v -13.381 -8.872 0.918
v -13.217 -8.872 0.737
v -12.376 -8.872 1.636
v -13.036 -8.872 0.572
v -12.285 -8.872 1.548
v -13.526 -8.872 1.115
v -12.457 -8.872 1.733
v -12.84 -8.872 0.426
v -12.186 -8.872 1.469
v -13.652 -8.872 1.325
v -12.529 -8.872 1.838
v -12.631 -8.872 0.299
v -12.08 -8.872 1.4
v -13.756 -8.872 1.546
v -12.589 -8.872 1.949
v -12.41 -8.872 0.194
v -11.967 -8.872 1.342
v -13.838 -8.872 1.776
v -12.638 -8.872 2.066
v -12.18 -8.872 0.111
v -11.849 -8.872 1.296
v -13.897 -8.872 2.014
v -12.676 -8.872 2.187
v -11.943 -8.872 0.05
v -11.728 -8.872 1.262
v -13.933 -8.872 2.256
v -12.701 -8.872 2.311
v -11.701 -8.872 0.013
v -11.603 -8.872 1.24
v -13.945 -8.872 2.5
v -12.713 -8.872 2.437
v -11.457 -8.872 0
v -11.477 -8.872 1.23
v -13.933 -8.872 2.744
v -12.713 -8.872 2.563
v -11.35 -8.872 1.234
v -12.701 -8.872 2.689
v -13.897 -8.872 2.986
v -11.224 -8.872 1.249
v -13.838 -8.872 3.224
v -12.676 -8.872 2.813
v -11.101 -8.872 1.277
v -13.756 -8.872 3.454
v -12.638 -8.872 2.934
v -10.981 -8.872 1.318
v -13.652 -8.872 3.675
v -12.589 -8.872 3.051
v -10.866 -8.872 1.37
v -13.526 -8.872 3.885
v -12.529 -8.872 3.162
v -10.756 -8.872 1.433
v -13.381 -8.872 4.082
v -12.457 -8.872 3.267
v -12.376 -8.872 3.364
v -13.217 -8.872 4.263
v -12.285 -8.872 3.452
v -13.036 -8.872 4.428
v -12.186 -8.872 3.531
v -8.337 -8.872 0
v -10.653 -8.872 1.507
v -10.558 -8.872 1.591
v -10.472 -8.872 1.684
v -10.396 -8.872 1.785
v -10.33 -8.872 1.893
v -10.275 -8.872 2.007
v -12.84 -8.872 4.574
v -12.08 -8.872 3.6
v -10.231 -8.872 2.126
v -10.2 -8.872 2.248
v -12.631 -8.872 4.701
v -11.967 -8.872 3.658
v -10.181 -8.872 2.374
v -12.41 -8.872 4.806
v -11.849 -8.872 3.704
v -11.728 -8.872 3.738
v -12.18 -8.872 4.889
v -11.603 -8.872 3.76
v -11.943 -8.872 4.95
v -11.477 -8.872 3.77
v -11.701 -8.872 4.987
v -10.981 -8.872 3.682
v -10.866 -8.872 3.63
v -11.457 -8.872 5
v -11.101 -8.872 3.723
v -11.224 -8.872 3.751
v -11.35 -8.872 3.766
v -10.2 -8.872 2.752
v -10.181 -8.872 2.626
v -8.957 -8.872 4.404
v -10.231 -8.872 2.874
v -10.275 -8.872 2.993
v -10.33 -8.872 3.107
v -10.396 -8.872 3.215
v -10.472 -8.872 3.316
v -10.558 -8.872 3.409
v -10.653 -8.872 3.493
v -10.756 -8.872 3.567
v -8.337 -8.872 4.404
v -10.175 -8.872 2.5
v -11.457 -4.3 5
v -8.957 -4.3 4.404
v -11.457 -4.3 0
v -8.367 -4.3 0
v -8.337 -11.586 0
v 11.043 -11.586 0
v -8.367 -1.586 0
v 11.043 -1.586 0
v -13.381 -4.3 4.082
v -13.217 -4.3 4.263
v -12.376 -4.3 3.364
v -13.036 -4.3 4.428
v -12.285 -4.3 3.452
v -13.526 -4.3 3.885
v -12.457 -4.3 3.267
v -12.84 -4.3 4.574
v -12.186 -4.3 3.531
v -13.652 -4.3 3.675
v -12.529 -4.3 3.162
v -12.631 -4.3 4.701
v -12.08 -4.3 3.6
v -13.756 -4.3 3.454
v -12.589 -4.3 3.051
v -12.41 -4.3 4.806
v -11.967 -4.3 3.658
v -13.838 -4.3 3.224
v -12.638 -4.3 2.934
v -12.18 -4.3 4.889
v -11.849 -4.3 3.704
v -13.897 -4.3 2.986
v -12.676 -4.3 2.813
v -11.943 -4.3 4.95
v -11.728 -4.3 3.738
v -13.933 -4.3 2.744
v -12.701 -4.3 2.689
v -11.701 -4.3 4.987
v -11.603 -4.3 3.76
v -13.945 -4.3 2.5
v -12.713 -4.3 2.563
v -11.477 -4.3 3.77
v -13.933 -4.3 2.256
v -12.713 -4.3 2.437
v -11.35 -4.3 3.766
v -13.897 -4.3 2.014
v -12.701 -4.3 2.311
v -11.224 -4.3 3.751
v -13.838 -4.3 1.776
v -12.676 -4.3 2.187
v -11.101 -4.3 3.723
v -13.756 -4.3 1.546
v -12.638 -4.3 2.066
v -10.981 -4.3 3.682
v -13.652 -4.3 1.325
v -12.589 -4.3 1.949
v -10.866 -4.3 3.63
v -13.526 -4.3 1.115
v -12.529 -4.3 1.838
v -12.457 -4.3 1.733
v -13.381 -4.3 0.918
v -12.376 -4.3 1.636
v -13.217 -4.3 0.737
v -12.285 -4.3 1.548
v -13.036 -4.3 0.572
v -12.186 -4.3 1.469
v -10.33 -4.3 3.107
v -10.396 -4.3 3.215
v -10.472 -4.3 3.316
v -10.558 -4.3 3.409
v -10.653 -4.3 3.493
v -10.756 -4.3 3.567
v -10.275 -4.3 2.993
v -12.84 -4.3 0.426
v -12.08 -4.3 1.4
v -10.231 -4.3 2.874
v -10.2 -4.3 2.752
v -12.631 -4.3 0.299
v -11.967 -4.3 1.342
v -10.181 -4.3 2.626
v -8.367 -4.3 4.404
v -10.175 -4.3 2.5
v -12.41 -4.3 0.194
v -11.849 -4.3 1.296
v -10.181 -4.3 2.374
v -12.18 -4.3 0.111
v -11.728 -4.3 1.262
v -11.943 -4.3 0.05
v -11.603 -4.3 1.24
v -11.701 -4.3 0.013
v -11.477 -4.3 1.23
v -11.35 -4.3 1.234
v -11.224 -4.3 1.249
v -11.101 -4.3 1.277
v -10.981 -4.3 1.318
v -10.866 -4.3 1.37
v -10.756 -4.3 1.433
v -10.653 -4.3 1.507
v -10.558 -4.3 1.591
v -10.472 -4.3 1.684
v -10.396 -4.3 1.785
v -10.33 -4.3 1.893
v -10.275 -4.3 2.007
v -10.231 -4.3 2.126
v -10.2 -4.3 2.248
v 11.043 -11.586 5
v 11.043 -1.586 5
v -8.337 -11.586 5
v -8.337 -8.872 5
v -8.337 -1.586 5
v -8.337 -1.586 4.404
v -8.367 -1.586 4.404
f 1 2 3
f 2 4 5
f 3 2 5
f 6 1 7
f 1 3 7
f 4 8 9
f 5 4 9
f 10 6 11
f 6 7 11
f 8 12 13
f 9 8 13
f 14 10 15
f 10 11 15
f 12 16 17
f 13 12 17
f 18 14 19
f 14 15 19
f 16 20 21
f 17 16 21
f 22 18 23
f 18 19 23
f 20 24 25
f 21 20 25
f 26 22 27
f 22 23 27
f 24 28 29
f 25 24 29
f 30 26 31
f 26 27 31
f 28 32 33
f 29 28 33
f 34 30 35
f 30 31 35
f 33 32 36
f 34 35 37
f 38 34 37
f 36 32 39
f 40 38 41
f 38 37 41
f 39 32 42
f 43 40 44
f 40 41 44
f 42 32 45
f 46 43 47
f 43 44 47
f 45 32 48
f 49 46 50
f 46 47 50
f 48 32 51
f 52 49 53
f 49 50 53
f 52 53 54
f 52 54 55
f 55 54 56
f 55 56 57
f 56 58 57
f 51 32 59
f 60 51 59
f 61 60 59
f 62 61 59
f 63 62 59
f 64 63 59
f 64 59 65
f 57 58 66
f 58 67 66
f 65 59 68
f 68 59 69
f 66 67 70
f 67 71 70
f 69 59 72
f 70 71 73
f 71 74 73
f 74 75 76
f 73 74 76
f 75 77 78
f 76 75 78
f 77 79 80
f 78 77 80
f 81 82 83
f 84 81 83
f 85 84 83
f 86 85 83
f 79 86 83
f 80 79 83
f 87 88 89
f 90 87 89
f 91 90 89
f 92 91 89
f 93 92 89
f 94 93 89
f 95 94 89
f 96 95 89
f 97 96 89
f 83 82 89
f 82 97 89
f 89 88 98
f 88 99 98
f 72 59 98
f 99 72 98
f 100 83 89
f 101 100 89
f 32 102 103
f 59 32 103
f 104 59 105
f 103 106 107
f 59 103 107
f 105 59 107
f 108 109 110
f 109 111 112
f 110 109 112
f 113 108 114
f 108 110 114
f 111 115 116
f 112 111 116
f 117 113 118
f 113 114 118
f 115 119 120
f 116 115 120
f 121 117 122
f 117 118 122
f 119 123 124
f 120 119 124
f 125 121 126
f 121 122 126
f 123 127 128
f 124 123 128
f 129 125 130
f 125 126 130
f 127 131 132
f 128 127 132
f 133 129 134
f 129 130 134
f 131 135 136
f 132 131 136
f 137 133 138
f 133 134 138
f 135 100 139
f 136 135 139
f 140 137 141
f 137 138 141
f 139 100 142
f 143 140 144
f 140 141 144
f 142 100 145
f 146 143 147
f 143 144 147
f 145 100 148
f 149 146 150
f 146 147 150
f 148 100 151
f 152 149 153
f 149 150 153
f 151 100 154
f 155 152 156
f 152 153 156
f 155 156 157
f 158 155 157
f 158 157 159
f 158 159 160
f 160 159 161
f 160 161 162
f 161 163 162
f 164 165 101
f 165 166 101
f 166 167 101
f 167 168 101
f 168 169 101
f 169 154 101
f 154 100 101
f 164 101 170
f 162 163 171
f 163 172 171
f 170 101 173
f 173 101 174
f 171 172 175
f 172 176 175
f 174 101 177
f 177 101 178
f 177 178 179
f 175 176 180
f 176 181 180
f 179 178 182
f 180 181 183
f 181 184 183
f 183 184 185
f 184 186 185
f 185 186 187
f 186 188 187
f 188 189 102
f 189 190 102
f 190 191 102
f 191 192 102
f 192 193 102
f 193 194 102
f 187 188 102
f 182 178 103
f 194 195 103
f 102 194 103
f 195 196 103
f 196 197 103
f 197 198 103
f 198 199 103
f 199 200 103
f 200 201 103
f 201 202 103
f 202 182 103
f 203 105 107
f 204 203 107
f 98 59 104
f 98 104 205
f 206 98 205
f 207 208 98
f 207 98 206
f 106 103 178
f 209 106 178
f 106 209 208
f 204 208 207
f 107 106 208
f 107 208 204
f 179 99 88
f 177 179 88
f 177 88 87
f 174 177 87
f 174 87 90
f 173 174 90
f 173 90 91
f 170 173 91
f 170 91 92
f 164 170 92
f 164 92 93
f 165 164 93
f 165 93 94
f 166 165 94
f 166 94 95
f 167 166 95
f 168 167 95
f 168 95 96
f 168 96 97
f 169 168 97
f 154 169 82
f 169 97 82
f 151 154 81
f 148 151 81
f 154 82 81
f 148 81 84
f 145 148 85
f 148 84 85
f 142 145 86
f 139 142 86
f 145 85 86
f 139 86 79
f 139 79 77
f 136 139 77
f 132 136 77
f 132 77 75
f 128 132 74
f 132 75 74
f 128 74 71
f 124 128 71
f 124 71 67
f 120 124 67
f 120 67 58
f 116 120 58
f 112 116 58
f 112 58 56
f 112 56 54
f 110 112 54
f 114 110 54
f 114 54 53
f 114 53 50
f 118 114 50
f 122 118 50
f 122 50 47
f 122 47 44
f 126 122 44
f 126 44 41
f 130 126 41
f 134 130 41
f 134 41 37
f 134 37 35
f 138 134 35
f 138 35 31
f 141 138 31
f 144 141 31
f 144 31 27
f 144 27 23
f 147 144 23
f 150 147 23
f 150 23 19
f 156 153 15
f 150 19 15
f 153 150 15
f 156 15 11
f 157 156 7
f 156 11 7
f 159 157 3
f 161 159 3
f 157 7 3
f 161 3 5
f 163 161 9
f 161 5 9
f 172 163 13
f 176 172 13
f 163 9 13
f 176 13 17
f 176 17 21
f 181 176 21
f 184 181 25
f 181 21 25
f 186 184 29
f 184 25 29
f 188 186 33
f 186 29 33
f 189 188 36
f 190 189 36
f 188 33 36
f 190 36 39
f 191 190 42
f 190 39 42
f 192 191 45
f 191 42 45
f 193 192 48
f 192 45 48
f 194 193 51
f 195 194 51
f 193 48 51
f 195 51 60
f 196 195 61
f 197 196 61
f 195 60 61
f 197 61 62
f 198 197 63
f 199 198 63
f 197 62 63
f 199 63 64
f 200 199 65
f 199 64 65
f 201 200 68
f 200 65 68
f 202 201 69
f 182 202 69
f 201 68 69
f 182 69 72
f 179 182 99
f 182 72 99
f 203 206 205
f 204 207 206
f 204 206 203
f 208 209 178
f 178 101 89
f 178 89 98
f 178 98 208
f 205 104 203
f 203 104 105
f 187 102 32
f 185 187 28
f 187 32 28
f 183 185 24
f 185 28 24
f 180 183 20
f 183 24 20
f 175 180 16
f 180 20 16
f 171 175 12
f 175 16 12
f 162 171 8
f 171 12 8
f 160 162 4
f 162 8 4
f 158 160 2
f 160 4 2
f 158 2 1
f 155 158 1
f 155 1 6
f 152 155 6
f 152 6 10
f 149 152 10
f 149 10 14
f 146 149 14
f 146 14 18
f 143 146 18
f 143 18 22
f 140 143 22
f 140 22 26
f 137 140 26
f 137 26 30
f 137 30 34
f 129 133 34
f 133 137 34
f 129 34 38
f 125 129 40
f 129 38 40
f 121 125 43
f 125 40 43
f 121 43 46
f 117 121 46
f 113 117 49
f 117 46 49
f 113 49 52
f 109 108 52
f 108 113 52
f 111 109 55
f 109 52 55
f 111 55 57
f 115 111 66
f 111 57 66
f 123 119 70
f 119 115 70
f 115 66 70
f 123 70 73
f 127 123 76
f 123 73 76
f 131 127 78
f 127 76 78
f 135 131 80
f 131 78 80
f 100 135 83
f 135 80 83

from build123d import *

# Parameters (mm, degrees)
F0_W      = 20
F0_H      = 10
F1_DEPTH  = 5
F3_DEPTH  = 5
F4_R      = 1.27
F5_DEPTH  = 7.287
F7_DEPTH  = 25.4
F9_DEPTH  = 25.4
F10_W     = 0.6200999394
F10_H     = 0.5964474939
F11_DEPTH = 25.4
F12_W     = 0.5901486054
F12_H     = 4.5354563772
F13_DEPTH = 25.4


with BuildPart() as f1:
    # F0 (on Top) → F1 (new body)
    with BuildSketch(Plane.XY):
        with Locations((1.042785123, -6.5861073174)):
            Rectangle(F0_W, F0_H)
    extrude(amount=F1_DEPTH)

    # F2 (on face) → F3 (join)
    with BuildSketch(Plane(origin=(-8.957214877, 0, 0), x_dir=(0, -1, 0), z_dir=(-1, 0, 0))):
        Polygon((4.3001073174, 0), (6.5861073174, 0), (8.8721073174, 0), (8.8721073174, 5), (6.5861073174, 5), (4.3001073174, 5), align=None)
    extrude(amount=F3_DEPTH)

    # F4 (on face) → F5 (cut, through all)
    with BuildSketch(Plane.XZ.offset(8.8721073174)):
        with BuildLine():
            ThreePointArc((-11.457214877, 0), (-13.9450408659, 2.5), (-11.457214877, 5))
            Line((-11.457214877, 5), (-14.9464672431, 5.5829798803))
            Line((-14.9464672431, 5.5829798803), (-15.761434359, 0.3301068575))
            Line((-15.761434359, 0.3301068575), (-11.6382623091, -0.7145671407))
            Line((-11.6382623091, -0.7145671407), (-11.457214877, 0))
        make_face()
        with Locations((-11.4450110796, 2.5)):
            Circle(F4_R)
    extrude(amount=-F5_DEPTH, mode=Mode.SUBTRACT)

    # F6 (on face) → F7 (cut)
    with BuildSketch(Plane.XZ.offset(8.8721073174)):
        Polygon((-8.957214877, 5), (-11.457214877, 5), (-8.957214877, 4.4035525061), align=None)
    extrude(amount=-F7_DEPTH, mode=Mode.SUBTRACT)

    # F8 (on face) → F9 (cut)
    with BuildSketch(Plane.XZ.offset(8.8721073174)):
        Polygon((-8.957214877, 5.1671843976), (-8.957214877, 4.4035525061), (-8.957214877, 0), (-8.3371149376, 0), (-8.3371149376, 5.1671843976), align=None)
    extrude(amount=F9_DEPTH, mode=Mode.SUBTRACT)

    # F10 (on face) → F11 (cut)
    with BuildSketch(Plane.XZ.offset(8.8721073174)):
        with Locations((-8.6471649073, 4.7017762531)):
            Rectangle(F10_W, F10_H)
    extrude(amount=-F11_DEPTH, mode=Mode.SUBTRACT)

    # F12 (on face) → F13 (cut)
    with BuildSketch(Plane(origin=(0, -4.3001073174, 0), x_dir=(-1, 0, 0), z_dir=(0, 1, 0))):
        with Locations((8.6621405743, 2.1358243175)):
            Rectangle(F12_W, F12_H)
    extrude(amount=F13_DEPTH, mode=Mode.SUBTRACT)


solid = f1.part
